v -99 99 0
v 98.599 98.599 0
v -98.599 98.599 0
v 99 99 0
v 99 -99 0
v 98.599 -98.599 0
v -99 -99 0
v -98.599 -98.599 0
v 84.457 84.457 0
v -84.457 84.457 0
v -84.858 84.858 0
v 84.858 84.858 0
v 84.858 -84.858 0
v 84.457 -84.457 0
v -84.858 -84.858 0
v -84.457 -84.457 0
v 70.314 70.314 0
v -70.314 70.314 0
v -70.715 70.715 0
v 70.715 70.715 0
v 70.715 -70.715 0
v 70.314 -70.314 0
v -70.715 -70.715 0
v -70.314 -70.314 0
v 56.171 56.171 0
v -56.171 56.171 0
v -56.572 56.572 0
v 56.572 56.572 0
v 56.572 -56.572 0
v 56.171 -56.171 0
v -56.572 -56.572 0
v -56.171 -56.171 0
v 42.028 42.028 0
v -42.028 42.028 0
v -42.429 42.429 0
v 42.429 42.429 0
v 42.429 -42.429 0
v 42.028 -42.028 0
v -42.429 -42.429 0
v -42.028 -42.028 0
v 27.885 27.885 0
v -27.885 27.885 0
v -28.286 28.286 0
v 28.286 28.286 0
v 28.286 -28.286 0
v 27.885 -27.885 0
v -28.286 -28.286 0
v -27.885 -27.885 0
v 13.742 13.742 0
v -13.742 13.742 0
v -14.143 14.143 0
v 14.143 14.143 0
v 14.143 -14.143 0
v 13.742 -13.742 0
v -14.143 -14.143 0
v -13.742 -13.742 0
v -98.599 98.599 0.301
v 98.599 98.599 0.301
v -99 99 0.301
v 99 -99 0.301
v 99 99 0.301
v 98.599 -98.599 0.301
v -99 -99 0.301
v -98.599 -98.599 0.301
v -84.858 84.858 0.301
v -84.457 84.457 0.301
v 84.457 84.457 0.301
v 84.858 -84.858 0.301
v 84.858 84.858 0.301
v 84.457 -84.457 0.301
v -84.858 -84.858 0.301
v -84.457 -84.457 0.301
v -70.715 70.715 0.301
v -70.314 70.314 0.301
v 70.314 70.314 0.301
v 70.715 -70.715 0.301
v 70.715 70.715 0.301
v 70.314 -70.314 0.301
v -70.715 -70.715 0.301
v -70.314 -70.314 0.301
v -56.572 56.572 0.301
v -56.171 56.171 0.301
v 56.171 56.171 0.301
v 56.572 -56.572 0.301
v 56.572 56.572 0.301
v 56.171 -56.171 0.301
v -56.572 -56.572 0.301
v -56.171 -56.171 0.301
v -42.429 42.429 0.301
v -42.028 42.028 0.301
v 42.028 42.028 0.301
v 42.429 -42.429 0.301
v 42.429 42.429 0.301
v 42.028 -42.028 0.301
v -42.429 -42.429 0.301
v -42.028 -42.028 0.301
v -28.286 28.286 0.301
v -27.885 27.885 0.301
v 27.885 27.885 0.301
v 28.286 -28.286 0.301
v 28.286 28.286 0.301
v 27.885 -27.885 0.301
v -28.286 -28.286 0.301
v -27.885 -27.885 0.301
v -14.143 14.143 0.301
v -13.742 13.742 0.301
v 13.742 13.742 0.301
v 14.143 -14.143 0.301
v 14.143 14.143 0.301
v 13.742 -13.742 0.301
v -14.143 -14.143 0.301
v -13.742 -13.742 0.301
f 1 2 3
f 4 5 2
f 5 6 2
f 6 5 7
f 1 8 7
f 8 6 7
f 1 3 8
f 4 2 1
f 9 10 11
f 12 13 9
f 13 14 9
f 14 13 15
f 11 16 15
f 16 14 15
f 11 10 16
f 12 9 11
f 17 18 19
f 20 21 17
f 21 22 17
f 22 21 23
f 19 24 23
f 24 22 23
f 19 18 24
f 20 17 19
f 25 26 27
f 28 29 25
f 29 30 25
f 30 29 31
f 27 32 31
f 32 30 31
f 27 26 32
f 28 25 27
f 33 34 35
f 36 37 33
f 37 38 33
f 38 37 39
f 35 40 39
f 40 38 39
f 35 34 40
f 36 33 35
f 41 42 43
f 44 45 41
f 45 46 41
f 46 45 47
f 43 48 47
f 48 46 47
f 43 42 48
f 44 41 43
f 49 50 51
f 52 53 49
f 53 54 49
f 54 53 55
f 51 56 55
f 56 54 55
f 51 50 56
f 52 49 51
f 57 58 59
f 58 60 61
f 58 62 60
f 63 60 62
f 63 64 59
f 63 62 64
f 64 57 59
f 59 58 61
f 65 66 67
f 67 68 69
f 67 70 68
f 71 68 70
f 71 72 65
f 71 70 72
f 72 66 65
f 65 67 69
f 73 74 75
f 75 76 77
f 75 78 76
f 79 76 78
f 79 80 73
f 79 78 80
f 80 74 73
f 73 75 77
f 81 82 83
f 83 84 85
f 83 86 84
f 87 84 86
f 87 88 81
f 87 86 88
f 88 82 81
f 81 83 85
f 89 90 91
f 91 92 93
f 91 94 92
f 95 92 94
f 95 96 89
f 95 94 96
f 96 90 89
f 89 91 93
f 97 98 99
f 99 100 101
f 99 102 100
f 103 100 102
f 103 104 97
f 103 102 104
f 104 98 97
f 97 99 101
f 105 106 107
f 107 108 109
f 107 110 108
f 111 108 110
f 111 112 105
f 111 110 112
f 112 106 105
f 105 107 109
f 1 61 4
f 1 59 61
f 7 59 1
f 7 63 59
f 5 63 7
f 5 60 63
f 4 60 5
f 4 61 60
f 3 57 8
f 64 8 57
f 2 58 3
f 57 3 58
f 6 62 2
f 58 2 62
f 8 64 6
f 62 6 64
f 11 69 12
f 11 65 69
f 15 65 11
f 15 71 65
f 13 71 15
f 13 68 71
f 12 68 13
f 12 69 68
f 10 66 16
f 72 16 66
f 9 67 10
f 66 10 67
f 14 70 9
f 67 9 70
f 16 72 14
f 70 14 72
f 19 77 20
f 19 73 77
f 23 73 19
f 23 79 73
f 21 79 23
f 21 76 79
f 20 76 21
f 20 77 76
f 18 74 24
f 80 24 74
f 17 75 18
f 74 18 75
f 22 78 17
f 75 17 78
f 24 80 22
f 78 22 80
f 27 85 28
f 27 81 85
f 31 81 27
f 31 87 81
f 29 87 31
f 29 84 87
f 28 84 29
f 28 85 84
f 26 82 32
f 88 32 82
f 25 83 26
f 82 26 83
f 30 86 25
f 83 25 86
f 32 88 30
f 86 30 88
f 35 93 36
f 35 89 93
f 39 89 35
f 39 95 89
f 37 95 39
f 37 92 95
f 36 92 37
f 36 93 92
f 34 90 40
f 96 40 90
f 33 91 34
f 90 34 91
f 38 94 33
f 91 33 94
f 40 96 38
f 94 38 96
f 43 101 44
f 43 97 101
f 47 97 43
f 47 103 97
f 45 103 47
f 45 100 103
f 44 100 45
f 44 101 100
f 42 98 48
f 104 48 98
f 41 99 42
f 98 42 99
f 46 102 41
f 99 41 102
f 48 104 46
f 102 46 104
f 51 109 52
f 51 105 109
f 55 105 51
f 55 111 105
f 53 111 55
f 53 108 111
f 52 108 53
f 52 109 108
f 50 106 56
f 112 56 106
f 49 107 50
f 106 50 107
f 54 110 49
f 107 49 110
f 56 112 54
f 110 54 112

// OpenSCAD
// These bed level test prints are inspired by this All3DP article here: https://all3dp.com/2/ender-3-pro-bed-leveling-gcode/

/* [General Parameters] */
// The type of bed level print to generate
Bed_Level_Print_Type = "concentric squares"; // ["concentric squares", "x in square", "circle in square", "perimeter", "grid", "five circles"]

// The width of the bed print area
Print_Area_Width = 220.001;

// The depth of the bed print area
Print_Area_Depth = 220.001;

// The width of the lines to print
Line_Width = 0.401;

// The height of the lines to print
Line_Height = 0.301;

// The percentage of the print area to use for the bed level print
Fill_Percentage = 90; // [50: 100]



/* [Bed Level Print Specific Parameters] */
// The number of square to print for the concentric squares bed level print
Concentric_Ring_Count = 7;

// The number of grids (horizontal and vertical) to print for the grid bed level print
Grid_Cell_Count = 4;



/* [Advanced Parameters] */
// Quality value (higher numbers mean better quality, lower numbers mean faster rendering)
Quality_Value = 128;



/* [Development Parameters] */
// Highlight the print area?
Show_Print_Area = false;

// Orient the model for creating a screenshot?
Orient_for_Screenshot = false;

// The viewport distance for the screenshot 
Screenshot_Vpd = 400.00;

// The viewport field of view for the screenshot
Screenshot_Vpf = 22.50;

// The viewport rotation for the screenshot
Screenshot_Vpr = [ 60.00, 0.00, 300.00 ];

// The viewport translation for the screenshot
Screenshot_Vpt = [ 0.00, -5.00, -16.00 ];



$fn = Quality_Value;



module Generate_Model()
{
    Reference_Size = min(Print_Area_Width, Print_Area_Depth)/Concentric_Ring_Count;
    Print_Width = Print_Area_Width * (Fill_Percentage/100);
    Print_Depth = Print_Area_Depth * (Fill_Percentage/100);



    // This is a generalization of OpenSCAD's circle function
    // If the diameter (d) or radius (r) is a single number, a circle will be drawn
    // If d or r are lists [x, y], an oval will be drawn instead
    module oval(d=1, r=undef)
    {
        diameterX = r == undef 
            ? is_list(d) ? d.x : d
            : is_list(r) ? r.x*2 : r*2;
        diameterY = r == undef 
            ? is_list(d) ? d.y : d
            : is_list(r) ? r.y*2 : r*2;

        diameterCircle = max(diameterX, diameterY);

        resize([diameterX, diameterY])
            circle(d=diameterCircle);
    }



    // Draws an oval outline
    module oval_ring(thickness=1, d=1, r=undef)
    {
        diameterX = r == undef 
            ? is_list(d) ? d.x : d
            : is_list(r) ? r.x*2 : r*2;
        diameterY = r == undef 
            ? is_list(d) ? d.y : d
            : is_list(r) ? r.y*2 : r*2;

        difference()
        {
            oval(d=[diameterX, diameterY]);
            oval(d=[diameterX-thickness*2, diameterY-thickness*2]);
        }
    }


    // Draws a rectangular ring
    module square_ring(dimensions=1, thickness=1, center=false)
    {
        width = is_list(dimensions) ? dimensions.x : x;
        height = is_list(dimensions) ? dimensions.y : y;

        difference()
        {
            square([width, height], center=center);
            square([width - thickness*2, height - thickness*2], center=center);
        }
    }



    // I don't have a good way of describing this shape
    // It's inspired by the "five circles" bed level print discussed here: https://all3dp.com/2/ender-3-pro-bed-leveling-gcode/
    // It also doesn't entirely work and needs to be rethought out or abandoned entirely
    // Specifically, it only really works if the width and height are the same
    module curved_x_pattern(size=2, thickness=1, cd=1, cr=undef)
    {
        // Draw a curved line running between the curved corners on each side
        // I'm not prepared to document this calcualation right now
        // Maybe I can scan in my notes?
        // Note that, at the moment, this doesn't work correctly for non-square print beds
        // Hopefully, I can figure this out at some point, but this is it for now
        module curved_side(X, Y, Rc, line_width)
        {
            theta = atan2(Y, X);
            xc = (Rc - line_width) * sin(theta);
            yc = (Rc - line_width) * cos(theta);
            ys = Y - yc;
            rs = ys/cos(theta);
            xs = rs * sin(theta);

            rsx = rs * (xs/ys);
            rsy = rs * (ys/xs);

            translate([X + xc + xs, 0])
                oval_ring(r=[rsx, rsy], line_width);
        }



        // Determine the characteristics of the rounded x
        width = is_list(size) ? size.x : size;
        height = is_list(size) ? size.y : size;
        corner_diameter = cr == undef ? cd : cr*2;
        corner_radius = corner_diameter/2;

        // Calculate the center offset of the curves that make up the corners of the x
        corner_x_offset = width/2 - corner_radius;
        corner_y_offset = height/2 - corner_radius;

        // Determine the diameters of an oval that passes through the center of each of the corners
        intersection_oval_diameter = sqrt(pow(corner_x_offset,2) + pow(corner_y_offset, 2))*2;
        intersection_oval_x_diameter = intersection_oval_diameter * (corner_x_offset/corner_y_offset);
        intersection_oval_y_diameter = intersection_oval_diameter * (corner_y_offset/corner_x_offset);

        // Generate the curves at each corner of the x
        difference()
        {
            for (x_mirror = [0, 1])
            for (y_mirror = [0, 1])
            mirror([x_mirror, 0])
            mirror([0, y_mirror])
            translate([corner_x_offset, corner_y_offset])
                oval_ring(d=corner_diameter, thickness);

            // Erase everything inside the intersection oval
            oval(d=[intersection_oval_x_diameter, intersection_oval_y_diameter]);
        }

        intersection()
        {
            union()
            {
                // Draw the curved sides on the left and right of the x
                for (x_mirror = [0, 1])
                mirror([x_mirror, 0])
                    curved_side(corner_x_offset, corner_y_offset, corner_radius, Line_Width);
                
                // Draw the curved sides on the top and bottom of the x
                for (y_mirror = [0, 1])
                mirror([0, y_mirror])
                rotate([0, 0, 90])
                    curved_side(corner_y_offset, corner_x_offset, corner_radius, Line_Width);
            }

            // Erase everything outside the intersection oval
            oval(d=[intersection_oval_x_diameter, intersection_oval_y_diameter]);
        }
    }



    module Generate_Concentric_Squares()
    {
        width_delta = Print_Width/Concentric_Ring_Count;
        depth_delta = Print_Depth/Concentric_Ring_Count;

        for (ring_number = [0 : Concentric_Ring_Count - 1])
        {
            ring_width = width_delta * (ring_number + 1);
            ring_depth = depth_delta * (ring_number + 1);

            square_ring([ring_width, ring_depth], Line_Width, center=true);
        }
    }


    
    module Generate_X_In_Square()
    {
        square_ring([Print_Width, Print_Depth], Line_Width, center=true);

        // Calculate the angle and length of the diagonal lines
        angle = atan2(Print_Depth, Print_Width);
        length = sqrt(pow(Print_Width, 2) + pow(Print_Depth, 2));

        intersection()
        {
            // Generate each line in the x
            for (z_rot = [angle, -angle])
            rotate([0, 0, z_rot])
                square([length, Line_Width], center=true);

            square([Print_Width, Print_Depth], center=true);
        }
    }



    module Generate_Circle_In_Square()
    {
        square_ring([Print_Width, Print_Depth], Line_Width, center=true);
        oval_ring(d=[Print_Width, Print_Depth], Line_Width);
    }



    module Generate_Perimeter()
    {
        square_ring([Print_Width, Print_Depth], Line_Width, center=true);
    }



    module Generate_Grid()
    {
        // Horizontal lines
        for (section_number = [0 : Grid_Cell_Count - 1])
        {
            section_width = Print_Width/Grid_Cell_Count;
            section_height = Print_Depth;
            x_offset = -Print_Width/2 + section_width * section_number + section_width/2;
            y_offset = 0;

            translate([x_offset, y_offset])
                square_ring([section_width, section_height], Line_Width, center=true);
        }

        // Vertical lines
        for (section_number = [0 : Grid_Cell_Count - 1])
        {
            section_width = Print_Width;
            section_height = Print_Depth/Grid_Cell_Count;
            x_offset = 0;
            y_offset = -Print_Depth/2 + section_height * section_number + section_height/2;

            translate([x_offset, y_offset])
                square_ring([section_width, section_height], Line_Width, center=true);
        }
    }



    module Generate_Five_Circles()
    {
        // The curved x pattern doesn't work correctly with non-square sizes yet
        // For now, size the pattern for the smallest bed dimension
        width = min(Print_Width, Print_Depth);
        height = width;

        circle_diameter = Reference_Size/2;
        border_offset = circle_diameter/2;
        corner_x_offset = width/2 - circle_diameter/2 - border_offset;
        corner_y_offset = height/2 - circle_diameter/2 - border_offset;

        // Filled circle in the center
        circle(d=circle_diameter);

        // Filled circles near the four corners
        for (x_mirror = [0, 1])
        mirror([x_mirror, 0])
        for (y_mirror = [0, 1])
        mirror([0, y_mirror])
        translate([corner_x_offset, corner_y_offset])
        {
            circle(d=circle_diameter);
        }

        // Generate the curved outline around the five circles
        corner_diameter = circle_diameter + border_offset*2;
        curved_x_pattern([width, height], Line_Width, cd=corner_diameter);
    }



    module Generate()
    {
        linear_extrude(Line_Height)
        {
            if (Bed_Level_Print_Type == "concentric squares")
            {
                Generate_Concentric_Squares();
            }
            else if (Bed_Level_Print_Type == "x in square")
            {
                Generate_X_In_Square();
            }
            else if (Bed_Level_Print_Type == "circle in square")
            {
                Generate_Circle_In_Square();
            }
            else if (Bed_Level_Print_Type == "perimeter")
            {
                Generate_Perimeter();
            }
            else if (Bed_Level_Print_Type == "grid")
            {
                Generate_Grid();
            }
            else if (Bed_Level_Print_Type == "five circles")
            {
                Generate_Five_Circles();
            }
        }
    }



    Generate();

    if (Show_Print_Area)
    {
        %square([Print_Area_Width, Print_Area_Depth], center=true);
    }
}



// Generate the model
Generate_Model();

// Orient the viewport
$vpd = Orient_for_Screenshot ? Screenshot_Vpd : $vpd;
$vpf = Orient_for_Screenshot ? Screenshot_Vpf : $vpf;
$vpr = Orient_for_Screenshot ? Screenshot_Vpr : $vpr;
$vpt = Orient_for_Screenshot ? Screenshot_Vpt : $vpt;
